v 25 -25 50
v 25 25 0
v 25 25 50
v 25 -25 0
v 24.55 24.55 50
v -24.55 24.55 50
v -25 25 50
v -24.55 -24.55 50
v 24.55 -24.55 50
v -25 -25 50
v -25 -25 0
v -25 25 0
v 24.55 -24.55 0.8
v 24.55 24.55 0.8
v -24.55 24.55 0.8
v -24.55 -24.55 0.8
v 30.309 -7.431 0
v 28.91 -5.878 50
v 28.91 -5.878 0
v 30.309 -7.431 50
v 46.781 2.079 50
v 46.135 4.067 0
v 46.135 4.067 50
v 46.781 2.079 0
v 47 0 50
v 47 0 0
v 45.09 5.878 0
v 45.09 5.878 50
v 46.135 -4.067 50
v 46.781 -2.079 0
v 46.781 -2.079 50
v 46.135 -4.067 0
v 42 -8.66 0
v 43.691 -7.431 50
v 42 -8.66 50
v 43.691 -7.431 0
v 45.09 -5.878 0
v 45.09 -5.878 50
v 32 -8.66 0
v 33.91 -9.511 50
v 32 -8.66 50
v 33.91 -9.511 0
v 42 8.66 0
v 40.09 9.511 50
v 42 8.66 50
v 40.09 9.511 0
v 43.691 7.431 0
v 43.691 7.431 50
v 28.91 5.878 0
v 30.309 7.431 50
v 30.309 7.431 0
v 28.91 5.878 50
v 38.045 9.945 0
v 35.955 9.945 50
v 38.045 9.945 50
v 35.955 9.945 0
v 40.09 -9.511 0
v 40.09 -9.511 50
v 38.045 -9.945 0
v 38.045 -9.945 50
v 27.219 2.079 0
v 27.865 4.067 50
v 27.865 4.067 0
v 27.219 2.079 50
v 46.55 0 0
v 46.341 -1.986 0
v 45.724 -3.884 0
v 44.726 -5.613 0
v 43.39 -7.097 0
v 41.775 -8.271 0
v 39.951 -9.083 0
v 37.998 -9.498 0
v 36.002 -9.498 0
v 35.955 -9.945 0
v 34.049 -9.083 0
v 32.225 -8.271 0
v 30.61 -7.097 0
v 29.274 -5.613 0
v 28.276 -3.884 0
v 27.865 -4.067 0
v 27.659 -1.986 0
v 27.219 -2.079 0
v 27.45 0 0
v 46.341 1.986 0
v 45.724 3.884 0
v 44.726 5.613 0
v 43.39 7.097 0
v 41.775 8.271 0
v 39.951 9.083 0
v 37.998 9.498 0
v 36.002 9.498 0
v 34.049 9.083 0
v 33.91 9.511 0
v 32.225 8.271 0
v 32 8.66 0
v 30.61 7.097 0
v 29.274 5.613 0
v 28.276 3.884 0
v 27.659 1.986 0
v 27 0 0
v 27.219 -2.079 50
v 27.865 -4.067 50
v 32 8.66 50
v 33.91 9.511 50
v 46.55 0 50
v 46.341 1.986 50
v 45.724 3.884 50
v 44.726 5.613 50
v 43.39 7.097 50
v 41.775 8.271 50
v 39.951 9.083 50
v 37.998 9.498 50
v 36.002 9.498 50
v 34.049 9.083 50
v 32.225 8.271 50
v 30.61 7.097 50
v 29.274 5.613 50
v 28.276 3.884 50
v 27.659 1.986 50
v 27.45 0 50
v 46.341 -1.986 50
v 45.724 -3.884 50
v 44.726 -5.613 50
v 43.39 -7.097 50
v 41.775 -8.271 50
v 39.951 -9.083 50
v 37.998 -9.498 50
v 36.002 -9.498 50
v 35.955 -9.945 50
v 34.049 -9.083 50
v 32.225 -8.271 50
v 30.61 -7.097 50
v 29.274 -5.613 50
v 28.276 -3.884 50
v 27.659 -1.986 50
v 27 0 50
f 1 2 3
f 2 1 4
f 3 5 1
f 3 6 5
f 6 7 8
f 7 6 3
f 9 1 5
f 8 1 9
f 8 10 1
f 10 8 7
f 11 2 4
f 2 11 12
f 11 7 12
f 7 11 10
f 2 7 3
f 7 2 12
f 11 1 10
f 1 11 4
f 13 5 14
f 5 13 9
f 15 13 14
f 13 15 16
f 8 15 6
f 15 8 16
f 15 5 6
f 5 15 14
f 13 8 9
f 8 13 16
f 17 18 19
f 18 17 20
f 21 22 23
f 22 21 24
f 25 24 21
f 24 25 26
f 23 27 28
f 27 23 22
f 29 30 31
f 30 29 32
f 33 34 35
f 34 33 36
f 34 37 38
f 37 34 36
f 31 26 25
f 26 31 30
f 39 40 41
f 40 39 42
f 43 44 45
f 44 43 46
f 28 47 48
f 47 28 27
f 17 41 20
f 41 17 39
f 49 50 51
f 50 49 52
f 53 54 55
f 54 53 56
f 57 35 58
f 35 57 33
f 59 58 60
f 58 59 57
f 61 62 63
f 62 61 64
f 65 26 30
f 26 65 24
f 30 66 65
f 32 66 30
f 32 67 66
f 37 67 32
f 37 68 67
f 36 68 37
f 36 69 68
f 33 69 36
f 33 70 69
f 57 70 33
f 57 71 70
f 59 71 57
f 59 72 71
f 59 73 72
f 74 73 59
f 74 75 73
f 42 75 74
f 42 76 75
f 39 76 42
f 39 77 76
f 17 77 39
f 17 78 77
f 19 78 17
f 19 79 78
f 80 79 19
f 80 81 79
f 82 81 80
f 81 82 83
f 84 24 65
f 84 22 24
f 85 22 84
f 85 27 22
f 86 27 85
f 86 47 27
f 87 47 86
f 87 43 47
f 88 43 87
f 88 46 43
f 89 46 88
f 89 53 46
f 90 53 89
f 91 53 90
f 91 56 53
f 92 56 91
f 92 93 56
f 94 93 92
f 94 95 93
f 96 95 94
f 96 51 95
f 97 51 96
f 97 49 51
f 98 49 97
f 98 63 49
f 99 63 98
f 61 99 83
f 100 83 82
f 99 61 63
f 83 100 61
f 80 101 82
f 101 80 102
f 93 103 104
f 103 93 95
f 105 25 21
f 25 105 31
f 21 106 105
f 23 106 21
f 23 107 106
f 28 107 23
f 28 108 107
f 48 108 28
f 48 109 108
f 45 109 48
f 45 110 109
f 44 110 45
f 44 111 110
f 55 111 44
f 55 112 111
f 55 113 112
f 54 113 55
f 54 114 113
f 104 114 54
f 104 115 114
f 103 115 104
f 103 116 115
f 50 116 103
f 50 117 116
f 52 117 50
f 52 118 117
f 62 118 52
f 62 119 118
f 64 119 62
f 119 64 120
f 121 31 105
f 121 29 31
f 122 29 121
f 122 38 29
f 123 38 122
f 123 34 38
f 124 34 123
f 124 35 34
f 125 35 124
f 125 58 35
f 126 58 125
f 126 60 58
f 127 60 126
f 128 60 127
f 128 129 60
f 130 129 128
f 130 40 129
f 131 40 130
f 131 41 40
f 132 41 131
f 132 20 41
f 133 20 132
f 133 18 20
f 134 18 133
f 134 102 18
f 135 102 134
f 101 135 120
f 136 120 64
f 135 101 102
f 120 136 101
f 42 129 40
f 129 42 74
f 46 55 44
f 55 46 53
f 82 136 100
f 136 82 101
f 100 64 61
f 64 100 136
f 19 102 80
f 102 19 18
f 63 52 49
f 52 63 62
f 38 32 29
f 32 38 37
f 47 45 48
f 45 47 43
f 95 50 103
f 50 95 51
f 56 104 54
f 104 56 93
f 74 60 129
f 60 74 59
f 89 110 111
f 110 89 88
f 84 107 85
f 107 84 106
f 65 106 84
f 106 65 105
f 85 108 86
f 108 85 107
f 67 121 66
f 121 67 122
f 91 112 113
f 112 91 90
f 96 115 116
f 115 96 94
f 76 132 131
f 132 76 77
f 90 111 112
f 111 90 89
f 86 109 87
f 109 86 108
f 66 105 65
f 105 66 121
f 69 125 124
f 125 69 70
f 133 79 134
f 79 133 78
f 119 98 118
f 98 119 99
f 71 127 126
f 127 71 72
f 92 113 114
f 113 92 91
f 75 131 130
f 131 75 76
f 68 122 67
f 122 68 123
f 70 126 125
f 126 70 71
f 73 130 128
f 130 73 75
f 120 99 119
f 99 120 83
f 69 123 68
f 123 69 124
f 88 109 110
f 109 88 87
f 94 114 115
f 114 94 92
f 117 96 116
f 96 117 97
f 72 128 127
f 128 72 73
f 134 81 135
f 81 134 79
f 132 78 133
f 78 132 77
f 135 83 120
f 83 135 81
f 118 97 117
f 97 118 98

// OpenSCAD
// Open-top, single-wall flow-rate calibration cube.
// Outer dimensions: 50 x 50 x 50 mm.
cube_size = 50;
wall_thickness = 0.45;
bottom_thickness = 0.8;
cylinder_diameter = 20;
cylinder_wall_thickness = wall_thickness;
cylinder_gap = 2;

assert(wall_thickness > 0, "wall_thickness must be greater than zero");
assert(bottom_thickness > 0, "bottom_thickness must be greater than zero");
assert(cube_size > 2 * wall_thickness, "Walls leave no interior");
assert(cube_size > bottom_thickness, "Bottom leaves no interior height");
assert(cylinder_wall_thickness > 0, "cylinder_wall_thickness must be greater than zero");
assert(cylinder_diameter > 2 * cylinder_wall_thickness, "Cylinder wall leaves no interior");

union() {
    difference() {
        translate([-cube_size / 2, -cube_size / 2, 0])
            cube([cube_size, cube_size, cube_size]);

        translate([
            -cube_size / 2 + wall_thickness,
            -cube_size / 2 + wall_thickness,
            bottom_thickness
        ])
            cube([
                cube_size - 2 * wall_thickness,
                cube_size - 2 * wall_thickness,
                cube_size - bottom_thickness + 0.02
            ]);
    }

    translate([
        cube_size / 2 + cylinder_gap + cylinder_diameter / 2,
        0,
        0
    ])
        difference() {
            cylinder(h = cube_size, d = cylinder_diameter);
            translate([0, 0, -0.01])
                cylinder(
                    h = cube_size + 0.02,
                    d = cylinder_diameter - 2 * cylinder_wall_thickness
                );
        }
}
